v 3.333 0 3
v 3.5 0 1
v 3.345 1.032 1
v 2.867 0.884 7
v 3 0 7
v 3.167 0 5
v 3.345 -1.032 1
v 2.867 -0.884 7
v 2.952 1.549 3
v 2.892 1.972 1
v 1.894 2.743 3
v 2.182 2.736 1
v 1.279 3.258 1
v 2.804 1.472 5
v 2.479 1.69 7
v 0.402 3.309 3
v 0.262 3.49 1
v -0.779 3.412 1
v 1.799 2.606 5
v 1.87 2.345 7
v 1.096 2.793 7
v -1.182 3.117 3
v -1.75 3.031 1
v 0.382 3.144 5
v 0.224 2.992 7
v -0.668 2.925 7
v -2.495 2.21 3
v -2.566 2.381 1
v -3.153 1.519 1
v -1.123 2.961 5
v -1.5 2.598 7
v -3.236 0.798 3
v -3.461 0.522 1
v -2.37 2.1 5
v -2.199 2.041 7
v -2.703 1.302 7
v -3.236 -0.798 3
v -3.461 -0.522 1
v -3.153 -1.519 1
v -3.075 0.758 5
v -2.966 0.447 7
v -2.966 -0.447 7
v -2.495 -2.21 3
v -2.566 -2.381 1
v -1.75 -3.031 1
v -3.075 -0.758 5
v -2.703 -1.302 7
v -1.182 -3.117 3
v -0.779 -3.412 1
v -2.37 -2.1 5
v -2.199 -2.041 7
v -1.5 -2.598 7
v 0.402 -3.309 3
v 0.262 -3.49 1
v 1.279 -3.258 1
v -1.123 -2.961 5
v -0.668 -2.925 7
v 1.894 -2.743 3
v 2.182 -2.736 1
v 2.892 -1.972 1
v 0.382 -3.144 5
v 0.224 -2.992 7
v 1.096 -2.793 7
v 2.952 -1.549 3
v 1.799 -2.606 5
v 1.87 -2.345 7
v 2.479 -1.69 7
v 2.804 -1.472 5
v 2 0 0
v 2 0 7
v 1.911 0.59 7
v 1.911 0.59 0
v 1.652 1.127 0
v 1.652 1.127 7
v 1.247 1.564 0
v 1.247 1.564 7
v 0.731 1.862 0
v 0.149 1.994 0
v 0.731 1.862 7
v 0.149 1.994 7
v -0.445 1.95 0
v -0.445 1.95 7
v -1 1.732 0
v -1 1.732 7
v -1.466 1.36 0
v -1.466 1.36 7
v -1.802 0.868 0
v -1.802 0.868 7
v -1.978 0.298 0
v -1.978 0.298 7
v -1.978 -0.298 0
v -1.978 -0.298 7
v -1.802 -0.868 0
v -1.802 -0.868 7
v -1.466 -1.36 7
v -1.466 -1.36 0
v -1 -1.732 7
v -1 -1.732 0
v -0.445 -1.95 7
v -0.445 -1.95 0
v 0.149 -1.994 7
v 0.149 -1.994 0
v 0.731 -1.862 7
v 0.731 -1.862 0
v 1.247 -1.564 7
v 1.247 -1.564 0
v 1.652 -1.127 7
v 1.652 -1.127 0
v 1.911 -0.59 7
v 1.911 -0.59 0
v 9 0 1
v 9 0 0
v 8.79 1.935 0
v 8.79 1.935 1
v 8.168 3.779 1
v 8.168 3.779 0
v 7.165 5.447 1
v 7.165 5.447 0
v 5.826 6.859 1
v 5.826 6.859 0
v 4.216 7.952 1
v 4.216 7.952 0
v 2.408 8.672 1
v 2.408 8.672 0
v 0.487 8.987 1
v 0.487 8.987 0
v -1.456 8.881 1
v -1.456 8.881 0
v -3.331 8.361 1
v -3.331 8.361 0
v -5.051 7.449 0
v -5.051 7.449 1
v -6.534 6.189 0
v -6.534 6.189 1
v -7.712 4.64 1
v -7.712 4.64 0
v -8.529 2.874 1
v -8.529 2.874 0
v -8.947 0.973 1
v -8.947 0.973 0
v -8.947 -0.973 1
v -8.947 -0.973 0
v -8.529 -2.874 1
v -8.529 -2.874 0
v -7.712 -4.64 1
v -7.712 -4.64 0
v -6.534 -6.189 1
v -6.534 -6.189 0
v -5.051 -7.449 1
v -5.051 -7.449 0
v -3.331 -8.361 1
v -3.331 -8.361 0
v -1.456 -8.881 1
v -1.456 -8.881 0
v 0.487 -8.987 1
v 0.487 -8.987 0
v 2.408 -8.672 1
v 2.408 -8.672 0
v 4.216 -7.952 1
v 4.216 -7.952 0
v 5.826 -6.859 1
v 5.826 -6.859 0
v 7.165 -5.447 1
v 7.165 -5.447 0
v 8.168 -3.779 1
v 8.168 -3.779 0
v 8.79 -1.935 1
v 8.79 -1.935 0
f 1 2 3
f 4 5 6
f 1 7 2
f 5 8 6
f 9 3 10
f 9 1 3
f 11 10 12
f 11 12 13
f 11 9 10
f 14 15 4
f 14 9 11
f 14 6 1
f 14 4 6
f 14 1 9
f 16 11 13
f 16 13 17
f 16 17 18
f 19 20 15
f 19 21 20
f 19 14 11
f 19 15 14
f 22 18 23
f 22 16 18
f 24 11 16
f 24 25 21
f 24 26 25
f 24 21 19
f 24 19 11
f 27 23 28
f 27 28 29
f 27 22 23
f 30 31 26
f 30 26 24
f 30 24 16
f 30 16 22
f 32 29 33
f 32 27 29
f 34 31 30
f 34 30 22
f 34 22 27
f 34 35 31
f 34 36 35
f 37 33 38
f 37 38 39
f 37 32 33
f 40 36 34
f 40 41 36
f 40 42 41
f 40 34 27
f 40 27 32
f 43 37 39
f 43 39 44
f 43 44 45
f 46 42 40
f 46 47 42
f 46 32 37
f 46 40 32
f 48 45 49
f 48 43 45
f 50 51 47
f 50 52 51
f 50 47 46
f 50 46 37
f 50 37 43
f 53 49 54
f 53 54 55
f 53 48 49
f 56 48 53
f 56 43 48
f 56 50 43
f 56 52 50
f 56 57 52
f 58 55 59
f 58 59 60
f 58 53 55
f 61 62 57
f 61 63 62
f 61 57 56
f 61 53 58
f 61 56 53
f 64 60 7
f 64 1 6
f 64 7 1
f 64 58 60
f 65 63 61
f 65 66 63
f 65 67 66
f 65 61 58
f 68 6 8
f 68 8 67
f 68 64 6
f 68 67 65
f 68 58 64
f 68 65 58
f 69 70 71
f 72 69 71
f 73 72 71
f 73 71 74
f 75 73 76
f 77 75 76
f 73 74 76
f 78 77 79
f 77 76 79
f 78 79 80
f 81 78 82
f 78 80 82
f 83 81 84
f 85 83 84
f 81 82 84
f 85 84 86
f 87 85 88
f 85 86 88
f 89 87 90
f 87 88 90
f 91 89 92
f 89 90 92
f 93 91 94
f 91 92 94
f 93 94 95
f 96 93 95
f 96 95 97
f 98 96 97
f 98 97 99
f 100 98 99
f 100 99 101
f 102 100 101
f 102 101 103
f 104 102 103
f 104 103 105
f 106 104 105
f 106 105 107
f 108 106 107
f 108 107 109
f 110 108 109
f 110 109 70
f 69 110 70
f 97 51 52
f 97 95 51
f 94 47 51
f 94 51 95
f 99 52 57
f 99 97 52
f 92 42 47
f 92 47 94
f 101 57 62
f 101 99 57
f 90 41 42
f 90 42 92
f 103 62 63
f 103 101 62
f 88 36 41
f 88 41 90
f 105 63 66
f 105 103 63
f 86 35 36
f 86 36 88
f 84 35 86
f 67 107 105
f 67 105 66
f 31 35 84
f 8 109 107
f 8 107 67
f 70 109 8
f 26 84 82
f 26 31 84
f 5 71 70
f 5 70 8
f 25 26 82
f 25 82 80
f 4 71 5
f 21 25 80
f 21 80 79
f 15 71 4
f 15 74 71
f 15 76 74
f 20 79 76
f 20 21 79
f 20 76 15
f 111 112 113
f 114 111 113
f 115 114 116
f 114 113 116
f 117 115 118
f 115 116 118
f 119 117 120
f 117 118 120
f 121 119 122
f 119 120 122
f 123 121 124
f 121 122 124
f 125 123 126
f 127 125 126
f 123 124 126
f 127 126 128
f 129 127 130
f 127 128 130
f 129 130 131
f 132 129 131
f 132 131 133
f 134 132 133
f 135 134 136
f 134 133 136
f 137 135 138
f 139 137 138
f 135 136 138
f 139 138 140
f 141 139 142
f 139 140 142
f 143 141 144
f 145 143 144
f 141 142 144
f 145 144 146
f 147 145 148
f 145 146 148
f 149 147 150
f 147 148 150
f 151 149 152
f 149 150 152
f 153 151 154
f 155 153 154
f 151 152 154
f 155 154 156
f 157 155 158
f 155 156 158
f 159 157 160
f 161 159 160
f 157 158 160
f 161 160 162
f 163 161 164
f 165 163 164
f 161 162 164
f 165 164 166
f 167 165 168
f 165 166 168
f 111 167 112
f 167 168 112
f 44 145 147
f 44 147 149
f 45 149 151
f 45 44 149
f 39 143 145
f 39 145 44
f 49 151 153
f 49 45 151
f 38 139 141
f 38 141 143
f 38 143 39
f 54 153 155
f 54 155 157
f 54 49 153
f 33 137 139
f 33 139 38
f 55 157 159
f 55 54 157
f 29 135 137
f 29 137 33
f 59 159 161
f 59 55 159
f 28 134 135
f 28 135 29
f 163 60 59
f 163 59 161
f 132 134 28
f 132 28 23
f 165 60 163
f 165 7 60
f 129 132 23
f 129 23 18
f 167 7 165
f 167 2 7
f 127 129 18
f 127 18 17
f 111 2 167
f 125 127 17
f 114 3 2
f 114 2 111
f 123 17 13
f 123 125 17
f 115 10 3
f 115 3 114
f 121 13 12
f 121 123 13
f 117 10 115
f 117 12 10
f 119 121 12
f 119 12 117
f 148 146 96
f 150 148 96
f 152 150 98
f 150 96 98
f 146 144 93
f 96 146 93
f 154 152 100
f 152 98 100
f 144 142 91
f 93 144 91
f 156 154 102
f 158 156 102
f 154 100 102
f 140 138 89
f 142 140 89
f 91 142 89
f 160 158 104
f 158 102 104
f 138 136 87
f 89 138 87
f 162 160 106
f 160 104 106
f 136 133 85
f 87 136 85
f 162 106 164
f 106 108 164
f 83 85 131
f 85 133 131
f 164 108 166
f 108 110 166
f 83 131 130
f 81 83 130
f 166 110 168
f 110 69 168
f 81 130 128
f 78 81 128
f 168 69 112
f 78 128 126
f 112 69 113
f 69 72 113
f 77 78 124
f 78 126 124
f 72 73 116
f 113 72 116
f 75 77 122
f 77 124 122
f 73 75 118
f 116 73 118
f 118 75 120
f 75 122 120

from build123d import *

# Parameters (mm, degrees)
SKETCH_R     = 9
PAD_DEPTH    = 1
SKETCH001_R  = 3.5
SKETCH002_R  = 3
SKETCH003_R  = 2
POCKET_DEPTH = 7.001


with BuildPart() as pad:
    # Sketch → Pad (new body)
    with BuildSketch(Plane.XY):
        Circle(SKETCH_R)
    extrude(amount=PAD_DEPTH)


with BuildPart() as pocket:
    # Sketch001 → Loft section 0
    with BuildSketch(Plane.XY.offset(1)):
        Circle(SKETCH001_R)
    # Sketch002 → Loft section 1
    with BuildSketch(Plane.XY.offset(7)):
        Circle(SKETCH002_R)
    loft()

    # Fusion: union Pad
    add(pad.part)

    # Sketch003 → Pocket (cut, through all)
    with BuildSketch(Plane.XY.offset(7)):
        Circle(SKETCH003_R)
    extrude(amount=-POCKET_DEPTH, mode=Mode.SUBTRACT)


solid = pocket.part
